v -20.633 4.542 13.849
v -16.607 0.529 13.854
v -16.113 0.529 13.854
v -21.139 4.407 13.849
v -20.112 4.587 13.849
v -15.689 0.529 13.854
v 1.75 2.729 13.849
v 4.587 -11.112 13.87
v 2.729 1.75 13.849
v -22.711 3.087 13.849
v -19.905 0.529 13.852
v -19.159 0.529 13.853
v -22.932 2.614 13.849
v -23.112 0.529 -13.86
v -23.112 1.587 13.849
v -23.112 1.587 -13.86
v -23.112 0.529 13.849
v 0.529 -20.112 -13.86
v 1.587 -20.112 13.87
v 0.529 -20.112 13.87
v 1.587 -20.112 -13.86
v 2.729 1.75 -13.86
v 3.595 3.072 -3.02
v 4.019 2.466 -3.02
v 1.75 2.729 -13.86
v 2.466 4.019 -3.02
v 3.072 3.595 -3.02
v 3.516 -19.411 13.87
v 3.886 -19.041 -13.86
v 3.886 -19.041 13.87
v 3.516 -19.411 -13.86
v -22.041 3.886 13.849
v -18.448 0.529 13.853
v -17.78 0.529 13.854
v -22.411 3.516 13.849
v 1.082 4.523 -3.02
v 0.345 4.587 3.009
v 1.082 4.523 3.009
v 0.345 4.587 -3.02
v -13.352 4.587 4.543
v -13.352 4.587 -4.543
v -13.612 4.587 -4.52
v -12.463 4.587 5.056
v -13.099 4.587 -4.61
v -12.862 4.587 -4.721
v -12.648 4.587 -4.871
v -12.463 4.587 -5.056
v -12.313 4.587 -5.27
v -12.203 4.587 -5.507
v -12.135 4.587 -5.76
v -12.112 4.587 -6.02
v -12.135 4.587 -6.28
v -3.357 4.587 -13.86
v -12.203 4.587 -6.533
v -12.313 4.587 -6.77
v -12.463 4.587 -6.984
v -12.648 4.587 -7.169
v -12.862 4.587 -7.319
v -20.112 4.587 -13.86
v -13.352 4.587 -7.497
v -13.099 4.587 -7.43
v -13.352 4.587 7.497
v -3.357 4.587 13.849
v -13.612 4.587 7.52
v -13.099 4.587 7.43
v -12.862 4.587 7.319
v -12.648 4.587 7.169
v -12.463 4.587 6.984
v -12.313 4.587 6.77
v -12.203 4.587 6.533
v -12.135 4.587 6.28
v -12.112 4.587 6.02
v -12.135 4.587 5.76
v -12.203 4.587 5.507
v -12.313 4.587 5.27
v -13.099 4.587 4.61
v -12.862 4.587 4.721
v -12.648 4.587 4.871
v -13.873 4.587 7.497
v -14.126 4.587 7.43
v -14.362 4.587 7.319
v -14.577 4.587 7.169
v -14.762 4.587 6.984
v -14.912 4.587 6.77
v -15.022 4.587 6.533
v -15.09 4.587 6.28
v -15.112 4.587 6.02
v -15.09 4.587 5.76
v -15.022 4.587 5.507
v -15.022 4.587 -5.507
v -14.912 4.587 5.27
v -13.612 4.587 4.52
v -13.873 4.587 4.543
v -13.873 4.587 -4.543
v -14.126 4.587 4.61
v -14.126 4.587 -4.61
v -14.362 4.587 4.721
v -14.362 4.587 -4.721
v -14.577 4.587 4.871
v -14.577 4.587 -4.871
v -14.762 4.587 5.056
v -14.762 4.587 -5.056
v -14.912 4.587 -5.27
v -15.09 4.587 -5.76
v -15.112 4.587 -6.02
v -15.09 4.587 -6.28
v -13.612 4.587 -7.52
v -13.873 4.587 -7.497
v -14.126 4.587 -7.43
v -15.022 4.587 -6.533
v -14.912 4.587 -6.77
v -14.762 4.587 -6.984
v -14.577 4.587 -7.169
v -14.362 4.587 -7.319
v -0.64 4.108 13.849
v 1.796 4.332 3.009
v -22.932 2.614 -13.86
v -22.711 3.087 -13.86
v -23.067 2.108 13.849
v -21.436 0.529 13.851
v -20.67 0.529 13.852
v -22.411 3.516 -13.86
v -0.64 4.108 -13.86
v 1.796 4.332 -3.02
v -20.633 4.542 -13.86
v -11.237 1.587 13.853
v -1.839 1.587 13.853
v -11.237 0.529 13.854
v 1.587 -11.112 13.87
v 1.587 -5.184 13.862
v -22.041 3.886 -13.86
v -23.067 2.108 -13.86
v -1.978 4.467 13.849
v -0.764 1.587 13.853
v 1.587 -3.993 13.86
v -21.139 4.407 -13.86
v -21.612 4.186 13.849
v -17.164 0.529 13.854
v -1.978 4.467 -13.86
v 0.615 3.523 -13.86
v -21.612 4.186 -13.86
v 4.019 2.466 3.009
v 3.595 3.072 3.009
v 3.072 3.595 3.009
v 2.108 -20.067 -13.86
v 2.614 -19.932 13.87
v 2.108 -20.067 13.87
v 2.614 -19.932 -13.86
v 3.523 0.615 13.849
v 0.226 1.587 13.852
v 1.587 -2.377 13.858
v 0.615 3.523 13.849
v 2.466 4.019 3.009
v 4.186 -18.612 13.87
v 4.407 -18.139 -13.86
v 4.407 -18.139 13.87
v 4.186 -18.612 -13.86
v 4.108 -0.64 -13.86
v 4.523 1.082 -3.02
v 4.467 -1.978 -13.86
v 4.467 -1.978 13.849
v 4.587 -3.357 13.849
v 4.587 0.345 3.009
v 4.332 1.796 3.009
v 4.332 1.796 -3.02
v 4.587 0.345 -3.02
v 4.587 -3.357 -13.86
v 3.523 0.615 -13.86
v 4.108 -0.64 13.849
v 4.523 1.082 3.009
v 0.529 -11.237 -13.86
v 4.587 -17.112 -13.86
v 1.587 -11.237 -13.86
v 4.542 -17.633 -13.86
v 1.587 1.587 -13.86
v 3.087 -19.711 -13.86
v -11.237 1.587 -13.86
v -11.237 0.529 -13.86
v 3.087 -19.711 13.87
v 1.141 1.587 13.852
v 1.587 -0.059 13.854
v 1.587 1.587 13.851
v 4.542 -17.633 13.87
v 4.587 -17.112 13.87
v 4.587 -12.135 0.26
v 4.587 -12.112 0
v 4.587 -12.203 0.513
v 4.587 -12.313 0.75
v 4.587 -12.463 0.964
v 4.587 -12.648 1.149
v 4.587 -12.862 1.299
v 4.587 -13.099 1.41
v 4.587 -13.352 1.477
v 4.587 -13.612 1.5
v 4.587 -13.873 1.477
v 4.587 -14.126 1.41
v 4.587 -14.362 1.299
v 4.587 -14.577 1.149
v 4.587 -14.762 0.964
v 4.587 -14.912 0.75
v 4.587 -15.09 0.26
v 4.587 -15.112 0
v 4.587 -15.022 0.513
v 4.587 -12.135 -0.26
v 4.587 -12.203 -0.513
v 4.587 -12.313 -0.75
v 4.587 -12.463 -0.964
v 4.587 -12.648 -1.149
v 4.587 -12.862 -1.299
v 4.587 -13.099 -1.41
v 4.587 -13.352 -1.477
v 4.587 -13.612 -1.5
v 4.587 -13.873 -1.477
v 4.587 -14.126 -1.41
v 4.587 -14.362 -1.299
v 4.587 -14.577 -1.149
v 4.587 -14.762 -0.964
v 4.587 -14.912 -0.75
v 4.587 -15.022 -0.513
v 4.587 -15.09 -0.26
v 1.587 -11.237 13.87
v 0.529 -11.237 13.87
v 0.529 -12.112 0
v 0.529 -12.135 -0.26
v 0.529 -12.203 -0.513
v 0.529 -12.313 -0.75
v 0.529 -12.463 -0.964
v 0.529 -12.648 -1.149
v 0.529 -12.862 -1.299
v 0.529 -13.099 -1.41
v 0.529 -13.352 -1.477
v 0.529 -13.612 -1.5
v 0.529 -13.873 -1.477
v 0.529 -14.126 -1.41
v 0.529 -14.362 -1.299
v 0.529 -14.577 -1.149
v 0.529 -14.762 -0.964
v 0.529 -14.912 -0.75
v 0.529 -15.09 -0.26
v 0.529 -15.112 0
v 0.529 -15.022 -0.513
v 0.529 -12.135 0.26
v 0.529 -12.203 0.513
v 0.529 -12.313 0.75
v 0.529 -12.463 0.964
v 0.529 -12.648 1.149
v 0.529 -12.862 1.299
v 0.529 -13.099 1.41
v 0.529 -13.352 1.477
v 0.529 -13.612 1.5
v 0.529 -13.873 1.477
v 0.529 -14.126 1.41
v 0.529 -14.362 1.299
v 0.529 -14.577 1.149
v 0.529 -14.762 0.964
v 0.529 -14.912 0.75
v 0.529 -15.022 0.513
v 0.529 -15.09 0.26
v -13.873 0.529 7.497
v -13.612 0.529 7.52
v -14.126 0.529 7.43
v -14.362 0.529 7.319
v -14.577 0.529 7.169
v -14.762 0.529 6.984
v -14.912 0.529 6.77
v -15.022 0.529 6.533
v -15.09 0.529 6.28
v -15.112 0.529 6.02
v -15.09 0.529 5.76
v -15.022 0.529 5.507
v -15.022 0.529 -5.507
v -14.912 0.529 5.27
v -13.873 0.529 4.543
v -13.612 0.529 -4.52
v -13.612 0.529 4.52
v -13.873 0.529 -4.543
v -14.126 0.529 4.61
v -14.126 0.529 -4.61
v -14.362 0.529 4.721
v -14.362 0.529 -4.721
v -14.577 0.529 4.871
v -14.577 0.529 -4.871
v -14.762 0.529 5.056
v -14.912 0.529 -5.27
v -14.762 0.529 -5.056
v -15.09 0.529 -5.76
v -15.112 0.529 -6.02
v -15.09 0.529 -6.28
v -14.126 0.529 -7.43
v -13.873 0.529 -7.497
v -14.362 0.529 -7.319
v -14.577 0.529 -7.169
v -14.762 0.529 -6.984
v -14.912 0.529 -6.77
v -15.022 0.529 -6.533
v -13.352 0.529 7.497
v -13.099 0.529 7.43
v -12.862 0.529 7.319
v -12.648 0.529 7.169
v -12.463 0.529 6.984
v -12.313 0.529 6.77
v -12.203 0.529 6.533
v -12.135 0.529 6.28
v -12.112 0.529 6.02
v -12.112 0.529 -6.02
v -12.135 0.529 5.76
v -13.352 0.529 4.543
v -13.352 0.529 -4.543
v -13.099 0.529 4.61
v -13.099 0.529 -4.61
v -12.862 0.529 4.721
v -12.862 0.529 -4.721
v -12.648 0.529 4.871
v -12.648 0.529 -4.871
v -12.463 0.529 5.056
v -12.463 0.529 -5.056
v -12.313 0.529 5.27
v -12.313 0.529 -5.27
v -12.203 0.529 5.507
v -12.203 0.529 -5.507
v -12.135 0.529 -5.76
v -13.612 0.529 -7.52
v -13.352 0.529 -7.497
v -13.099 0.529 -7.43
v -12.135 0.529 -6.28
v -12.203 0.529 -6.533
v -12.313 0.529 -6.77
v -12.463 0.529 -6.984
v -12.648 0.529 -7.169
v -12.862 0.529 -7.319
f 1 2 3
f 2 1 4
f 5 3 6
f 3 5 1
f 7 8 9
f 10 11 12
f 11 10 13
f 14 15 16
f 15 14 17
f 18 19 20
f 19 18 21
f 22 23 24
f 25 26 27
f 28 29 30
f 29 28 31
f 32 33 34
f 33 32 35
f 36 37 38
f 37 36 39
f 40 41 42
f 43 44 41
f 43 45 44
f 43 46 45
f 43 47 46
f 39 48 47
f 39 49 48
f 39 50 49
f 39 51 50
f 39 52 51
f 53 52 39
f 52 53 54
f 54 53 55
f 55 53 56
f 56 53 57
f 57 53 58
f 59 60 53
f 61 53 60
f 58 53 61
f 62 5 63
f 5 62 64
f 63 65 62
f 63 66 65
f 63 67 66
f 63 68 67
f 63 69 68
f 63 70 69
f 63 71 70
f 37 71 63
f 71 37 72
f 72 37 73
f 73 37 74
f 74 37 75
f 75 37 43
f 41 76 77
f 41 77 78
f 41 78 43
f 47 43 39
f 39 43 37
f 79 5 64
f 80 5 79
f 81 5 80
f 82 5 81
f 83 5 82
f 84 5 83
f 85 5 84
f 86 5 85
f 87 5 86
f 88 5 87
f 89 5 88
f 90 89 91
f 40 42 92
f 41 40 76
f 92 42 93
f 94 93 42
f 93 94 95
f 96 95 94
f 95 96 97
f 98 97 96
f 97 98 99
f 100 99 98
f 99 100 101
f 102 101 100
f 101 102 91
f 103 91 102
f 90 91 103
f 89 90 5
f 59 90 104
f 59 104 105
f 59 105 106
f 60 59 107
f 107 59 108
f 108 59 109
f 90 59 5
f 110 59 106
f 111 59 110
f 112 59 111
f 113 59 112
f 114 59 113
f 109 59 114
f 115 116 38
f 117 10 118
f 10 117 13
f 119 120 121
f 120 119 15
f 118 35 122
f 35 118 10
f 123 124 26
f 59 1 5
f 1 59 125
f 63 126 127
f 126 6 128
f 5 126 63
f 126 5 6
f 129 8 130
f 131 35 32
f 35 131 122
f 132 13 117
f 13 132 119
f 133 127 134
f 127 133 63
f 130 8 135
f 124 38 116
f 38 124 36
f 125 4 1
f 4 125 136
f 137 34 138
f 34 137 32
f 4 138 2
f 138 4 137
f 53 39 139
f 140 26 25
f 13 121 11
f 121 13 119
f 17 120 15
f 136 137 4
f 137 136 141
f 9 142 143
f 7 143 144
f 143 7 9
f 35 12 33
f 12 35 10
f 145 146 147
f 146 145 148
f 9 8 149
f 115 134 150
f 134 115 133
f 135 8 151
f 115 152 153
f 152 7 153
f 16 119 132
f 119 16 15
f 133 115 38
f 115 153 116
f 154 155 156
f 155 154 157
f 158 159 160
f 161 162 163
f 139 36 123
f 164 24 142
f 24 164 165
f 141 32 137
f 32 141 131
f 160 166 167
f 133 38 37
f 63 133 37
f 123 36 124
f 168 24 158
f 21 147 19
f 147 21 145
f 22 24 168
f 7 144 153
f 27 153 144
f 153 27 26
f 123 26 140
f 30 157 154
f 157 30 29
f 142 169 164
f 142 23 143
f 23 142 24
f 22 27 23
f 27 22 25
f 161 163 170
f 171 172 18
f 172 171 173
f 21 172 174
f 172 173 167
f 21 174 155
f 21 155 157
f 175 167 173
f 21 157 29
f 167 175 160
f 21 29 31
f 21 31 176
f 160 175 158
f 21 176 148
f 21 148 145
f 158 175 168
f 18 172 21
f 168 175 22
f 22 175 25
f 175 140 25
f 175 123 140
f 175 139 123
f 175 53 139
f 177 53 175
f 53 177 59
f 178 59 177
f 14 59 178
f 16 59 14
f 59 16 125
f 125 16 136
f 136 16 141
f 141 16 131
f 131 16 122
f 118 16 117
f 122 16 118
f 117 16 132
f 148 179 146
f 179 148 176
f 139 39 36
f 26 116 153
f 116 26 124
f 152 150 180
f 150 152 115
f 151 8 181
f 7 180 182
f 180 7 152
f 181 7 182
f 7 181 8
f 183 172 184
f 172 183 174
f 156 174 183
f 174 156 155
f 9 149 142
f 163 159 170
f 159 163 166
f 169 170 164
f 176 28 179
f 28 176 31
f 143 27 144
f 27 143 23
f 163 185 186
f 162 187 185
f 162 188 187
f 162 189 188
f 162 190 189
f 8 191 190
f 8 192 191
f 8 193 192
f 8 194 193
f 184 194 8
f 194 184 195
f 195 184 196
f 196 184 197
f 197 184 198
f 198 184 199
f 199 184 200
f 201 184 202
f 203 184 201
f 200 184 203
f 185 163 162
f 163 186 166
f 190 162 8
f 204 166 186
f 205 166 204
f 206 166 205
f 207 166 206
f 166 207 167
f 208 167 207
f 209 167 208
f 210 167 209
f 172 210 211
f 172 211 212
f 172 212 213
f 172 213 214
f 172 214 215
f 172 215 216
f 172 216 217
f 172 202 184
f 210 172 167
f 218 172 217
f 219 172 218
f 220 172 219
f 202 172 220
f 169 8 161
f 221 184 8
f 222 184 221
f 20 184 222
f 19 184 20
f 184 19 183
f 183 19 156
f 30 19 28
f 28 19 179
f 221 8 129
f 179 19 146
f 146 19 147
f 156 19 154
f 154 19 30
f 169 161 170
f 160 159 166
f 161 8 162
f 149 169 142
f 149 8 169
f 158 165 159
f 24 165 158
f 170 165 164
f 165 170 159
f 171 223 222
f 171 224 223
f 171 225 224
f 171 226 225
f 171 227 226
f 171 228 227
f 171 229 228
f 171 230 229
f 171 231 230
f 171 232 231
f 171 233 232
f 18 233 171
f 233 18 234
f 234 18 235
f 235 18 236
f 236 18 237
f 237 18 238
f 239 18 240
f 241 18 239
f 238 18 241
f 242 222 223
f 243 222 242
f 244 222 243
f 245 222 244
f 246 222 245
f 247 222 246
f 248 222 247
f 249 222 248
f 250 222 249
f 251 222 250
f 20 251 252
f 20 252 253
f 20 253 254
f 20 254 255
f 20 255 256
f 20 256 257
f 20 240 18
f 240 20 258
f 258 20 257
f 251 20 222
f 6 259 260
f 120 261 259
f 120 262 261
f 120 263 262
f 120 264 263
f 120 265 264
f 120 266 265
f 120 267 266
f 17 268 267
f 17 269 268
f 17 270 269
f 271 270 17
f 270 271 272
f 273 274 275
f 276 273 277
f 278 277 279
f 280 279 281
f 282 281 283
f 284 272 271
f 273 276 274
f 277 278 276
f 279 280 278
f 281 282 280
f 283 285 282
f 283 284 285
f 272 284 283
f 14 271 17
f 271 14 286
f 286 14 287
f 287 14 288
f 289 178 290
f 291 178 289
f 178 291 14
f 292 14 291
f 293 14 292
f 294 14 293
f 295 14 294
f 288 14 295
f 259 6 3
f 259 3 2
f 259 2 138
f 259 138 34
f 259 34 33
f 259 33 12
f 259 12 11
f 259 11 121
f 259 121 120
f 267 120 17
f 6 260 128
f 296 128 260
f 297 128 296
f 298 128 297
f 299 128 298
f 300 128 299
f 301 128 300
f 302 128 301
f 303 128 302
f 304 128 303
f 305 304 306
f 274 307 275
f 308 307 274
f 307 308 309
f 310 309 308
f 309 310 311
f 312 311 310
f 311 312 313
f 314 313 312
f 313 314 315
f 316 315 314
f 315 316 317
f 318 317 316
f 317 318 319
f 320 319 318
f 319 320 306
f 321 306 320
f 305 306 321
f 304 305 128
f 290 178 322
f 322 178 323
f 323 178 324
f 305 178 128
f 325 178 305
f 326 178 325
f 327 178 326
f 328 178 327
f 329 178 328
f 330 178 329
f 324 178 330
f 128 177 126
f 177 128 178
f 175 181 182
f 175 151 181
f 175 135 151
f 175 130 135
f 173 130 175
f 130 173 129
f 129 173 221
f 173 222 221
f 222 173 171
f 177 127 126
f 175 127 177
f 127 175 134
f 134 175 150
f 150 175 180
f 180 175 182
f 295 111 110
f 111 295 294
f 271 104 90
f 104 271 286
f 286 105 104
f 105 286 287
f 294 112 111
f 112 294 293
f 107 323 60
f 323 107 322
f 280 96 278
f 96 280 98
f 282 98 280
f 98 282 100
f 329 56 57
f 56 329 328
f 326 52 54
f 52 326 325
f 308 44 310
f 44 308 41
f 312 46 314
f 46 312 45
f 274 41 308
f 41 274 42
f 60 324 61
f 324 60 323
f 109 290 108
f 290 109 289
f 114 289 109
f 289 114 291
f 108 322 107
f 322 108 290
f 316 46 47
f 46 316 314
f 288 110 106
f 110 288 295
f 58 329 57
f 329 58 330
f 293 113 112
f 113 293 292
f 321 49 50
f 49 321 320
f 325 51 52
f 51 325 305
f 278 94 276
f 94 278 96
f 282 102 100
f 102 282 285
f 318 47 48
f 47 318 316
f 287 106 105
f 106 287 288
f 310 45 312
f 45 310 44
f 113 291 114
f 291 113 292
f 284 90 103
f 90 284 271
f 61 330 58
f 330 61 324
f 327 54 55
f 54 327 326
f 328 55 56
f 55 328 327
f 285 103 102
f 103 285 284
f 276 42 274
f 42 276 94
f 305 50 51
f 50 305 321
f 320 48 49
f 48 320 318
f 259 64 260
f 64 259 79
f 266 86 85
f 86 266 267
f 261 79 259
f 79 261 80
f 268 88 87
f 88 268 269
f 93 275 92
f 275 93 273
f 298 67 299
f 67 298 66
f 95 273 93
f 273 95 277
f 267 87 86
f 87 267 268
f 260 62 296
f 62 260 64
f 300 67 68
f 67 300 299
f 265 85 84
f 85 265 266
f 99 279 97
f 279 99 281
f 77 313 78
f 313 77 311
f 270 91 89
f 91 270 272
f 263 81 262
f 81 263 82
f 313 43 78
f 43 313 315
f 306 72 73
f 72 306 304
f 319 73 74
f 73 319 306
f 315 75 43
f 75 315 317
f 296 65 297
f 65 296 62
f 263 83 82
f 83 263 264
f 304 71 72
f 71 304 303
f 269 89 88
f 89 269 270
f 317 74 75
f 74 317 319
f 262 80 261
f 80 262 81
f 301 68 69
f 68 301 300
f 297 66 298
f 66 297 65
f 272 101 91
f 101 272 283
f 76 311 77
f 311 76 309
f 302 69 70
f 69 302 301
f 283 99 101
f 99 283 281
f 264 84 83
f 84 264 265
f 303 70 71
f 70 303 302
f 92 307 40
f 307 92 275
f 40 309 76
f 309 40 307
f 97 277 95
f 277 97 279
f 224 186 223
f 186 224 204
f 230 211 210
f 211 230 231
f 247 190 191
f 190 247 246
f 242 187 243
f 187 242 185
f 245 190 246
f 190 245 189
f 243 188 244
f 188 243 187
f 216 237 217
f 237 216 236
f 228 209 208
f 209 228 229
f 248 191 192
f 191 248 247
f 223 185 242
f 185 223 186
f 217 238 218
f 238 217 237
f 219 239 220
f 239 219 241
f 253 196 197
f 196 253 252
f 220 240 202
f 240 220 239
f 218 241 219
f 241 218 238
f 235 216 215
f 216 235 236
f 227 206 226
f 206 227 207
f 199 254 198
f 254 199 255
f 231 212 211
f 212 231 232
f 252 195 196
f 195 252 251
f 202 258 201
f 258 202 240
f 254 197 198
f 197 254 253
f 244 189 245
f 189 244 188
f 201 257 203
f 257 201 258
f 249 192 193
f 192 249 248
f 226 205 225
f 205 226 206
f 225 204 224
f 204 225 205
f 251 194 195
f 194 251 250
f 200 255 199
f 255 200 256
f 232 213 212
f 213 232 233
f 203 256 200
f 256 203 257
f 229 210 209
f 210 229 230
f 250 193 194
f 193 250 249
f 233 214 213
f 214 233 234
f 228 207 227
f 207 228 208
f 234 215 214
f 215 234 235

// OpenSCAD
// file: CKvarsProfile_36in_201906.scad
///////////////////  USER SETTINGS  ///////////////////

/////////////
//  USING THIS FILE:
//  choose desired settings below
//  rename and save this file into the "SCAD" folder
//  for example CKvarsProfile-Small2019.scad
//  then open the file named CKvars.scad in the "SCAD" folder
//  find the "include" commands at the begining of the file
//  change this information to the new file's name, then save
//  you can now open then render each part file with these settings
/////////////

//File Notes - Large201903
// attempting to get near 45" 1100mm fabric width/circumference
// 

/////////////
// DIMENSIONS

//number of "p2" needle guides around circle                    //Jan2019  //small
UPp2number=30;                //12                //36  ///36   //12       //8

//number of needles mounted on each "p2" part
UPp2needles=5;                //5                 //10  ///5    //5        //7

//number of "p3" parts around circle
UPp3number=10;                 //4                 //18  ///4    //4        //2

//number of "p4" parts around circle
UPp4number=10;                 //4                 //18  ///4    //4        //2

//distance from the inside face of one needle to the next
UPneedle2needle=9.7;     //default=14.35615  //try 8.414    //13.5334  //9.25

//mountain settings
UPpMgrooveturnR=14; //radius of upper curved path in groove //14  //10
UPpMgrooveturnR2=7; //radius of lower curved path in groove //7
UPpMp3X=2.5;        //length of lower plateu of groove  //2.5   //2
UPpMp7X=3;          //half of length of top plateu of groove //3  //2

UPnumberMountain=6;

/////////////
// MATERIALS

//thread diameter
UPthreadD=2.5;

//number of stepper motors driving the geared plate
UPc1steppersnumber=UPnumberMountain;  

//laser cut part thickness
UPupper_surfaceH=5;  //thickness of upper rotating plate  ///5  //6.35= 1/4"inch
UPbottom_surface_motor_gearsH=5;  //thickness of geared rotating plate
UPtable_surface=10;        //thickness of plate of main table

UPtable_support=12.7;       //thickness of support board below table surface

//width of wood used to support table around the edges
UPwoodbeamW=25.4;           //table leg wood beam width  1.0 inch
UPwoodbeamScrewOD=6;     // M6 screw hole into wood beam

//thread feeder option
UPTF=1;    //  0=none  1=angle iron  2=makerbeam10mm

//angle iron option dimensions
UPaaX=12.7;      //width            //12.7    =  1/2in          
UPaaT=1.5875;    //thickness        //1.5875  = 1/16in

///////////////////////////////////////////////
// file: CKvarsNeedle-KH260.scad
//NEEDLE for Brother KH260
//measurements by dorkmo

nX=1.4;    //typical thickness from side to side
nY=2.44;   //typical thickness from front to back
nA=157.9;  //total length of needle
nB=53;     //distance from bottom of needle to bottom of bent tab.
nC=4.82;   //thickness of bent tab. top to bottom.
nD=5.48;   //hook front to back
nE=4.10;   //from top of loop to bottom of hook
nF=22.0;   //from top of loop to bottom of flipper in down position
nG=1.10;   //minimum thickness of hook. front to back.
nH=17.03;  //max distance from front to back
nT=0;      //0=straight tail 1=bent tail aka folded back. Y of tail = C if T=1.
// main file
include <CKvars.scad>;

CKpM3();



module CKpM3(){    
translate([0,0,-pM3H/2]){
mirror([0,1,0])
mirror([1,0,0])
difference(){

hull(){
pM3profile(pM3c2e+pM3c2c+pM3c2e,0.5);    
    translate([0,0,pM3c2e+aaboltD])
pM3profile(pM3c2c-(aaboltD*2),pM3mink);
}    

translate([-aaT/3,-aaT/3,0])
  cube([(aaboltD*3)+aaX+pM3mink,(aaboltD*3)+aaX+pM3mink,pM3H+1]);  //cube 

translate([-aaT,-aaT,0])
  cube([aaX+pM3slop/2,aaX+pM3slop/2,pM3H+1]);  //cube 

    
     translate([-(-(aaX-aaT)-(aaboltD/2)-1),0,pM3c2e])  
 rotate([90,0,0])
   cylinder(d=aaboltD,h=aaX,$fn=36);
 translate([-(-(aaX-aaT)-(aaboltD/2)-1),0,pM3c2e+pM3c2c])  
 rotate([90,0,0])
   cylinder(d=aaboltD,h=aaX,$fn=36);

     translate([0,-(-(aaX-aaT)-(aaboltD/2)-1),pM3c2e+(pM3c2c/2)])  
 rotate([90,0,270])
   #cylinder(d=aaboltD,h=aaX,$fn=36);
    
} //end diff
} //end Z trans
} //end module



module pM3profile(h,c){
    
RM=pM3mink/2; //constant = r of minkoswki
RrD=c;  //distance from corner  = c
RrC=(RM*RM)-((RrD/2)*(RrD/2));  //distance from corner   //cos(45)*aaT  ??
RtX=((sqrt(2))*(sqrt((RM*RM)+(RrC*RrC)+(2*RM*RrC))))-RM-RrC;
RrR=RtX+RM;
    
    difference(){
minkowski(){
difference(){
translate([-aaT,-aaT,0])
  cube([(aaboltD*3)+aaX,(aaboltD*2)+aaX,h]);  //cube 
  cube([(aaboltD*3)+aaX-aaT,(aaboltD*2)+aaX-aaT,h]);
}
cylinder(d=pM3mink, h=0.01, $fn=36);  //,h=0.01  $fn=72
} //end mink
translate([-aaT/3,-aaT/3,0])
  cube([(aaboltD*3)+aaX+pM3mink,aaX+pM3mink,h]);  //cube 
translate([0,0,h-0.011])
  minkowski(){
    difference(){
    translate([-aaT,-aaT,0])
      cube([(aaboltD*3)+aaX,aaX,h]);  //cube 
      cube([(aaboltD*3)+aaX-aaT,aaX-aaT,h]);
}
    cylinder(d=pM3mink, h=0.01, $fn=36);  //,h=0.01  $fn=72
} //end mink

difference(){
  translate([-aaT,-aaT,0])
    cube([aaX+pM3slop/2,aaX+pM3slop/2,h]);  //cube 
}

//cornercut
translate([0,0,0])
intersection(){
    translate([-aaT+RtX-(RtX+RM),-aaT+RtX-(RtX+RM),0])
#cube([RtX+RM,RtX+RM,h]);    
translate([-aaT+RtX,-aaT+RtX,0])
difference(){
    cylinder(r=RrR+20, h=h, $fn=18);
    cylinder(r=RrR, h=h+1, $fn=36);
}

} //end intersection

} //end diff
} //end module
